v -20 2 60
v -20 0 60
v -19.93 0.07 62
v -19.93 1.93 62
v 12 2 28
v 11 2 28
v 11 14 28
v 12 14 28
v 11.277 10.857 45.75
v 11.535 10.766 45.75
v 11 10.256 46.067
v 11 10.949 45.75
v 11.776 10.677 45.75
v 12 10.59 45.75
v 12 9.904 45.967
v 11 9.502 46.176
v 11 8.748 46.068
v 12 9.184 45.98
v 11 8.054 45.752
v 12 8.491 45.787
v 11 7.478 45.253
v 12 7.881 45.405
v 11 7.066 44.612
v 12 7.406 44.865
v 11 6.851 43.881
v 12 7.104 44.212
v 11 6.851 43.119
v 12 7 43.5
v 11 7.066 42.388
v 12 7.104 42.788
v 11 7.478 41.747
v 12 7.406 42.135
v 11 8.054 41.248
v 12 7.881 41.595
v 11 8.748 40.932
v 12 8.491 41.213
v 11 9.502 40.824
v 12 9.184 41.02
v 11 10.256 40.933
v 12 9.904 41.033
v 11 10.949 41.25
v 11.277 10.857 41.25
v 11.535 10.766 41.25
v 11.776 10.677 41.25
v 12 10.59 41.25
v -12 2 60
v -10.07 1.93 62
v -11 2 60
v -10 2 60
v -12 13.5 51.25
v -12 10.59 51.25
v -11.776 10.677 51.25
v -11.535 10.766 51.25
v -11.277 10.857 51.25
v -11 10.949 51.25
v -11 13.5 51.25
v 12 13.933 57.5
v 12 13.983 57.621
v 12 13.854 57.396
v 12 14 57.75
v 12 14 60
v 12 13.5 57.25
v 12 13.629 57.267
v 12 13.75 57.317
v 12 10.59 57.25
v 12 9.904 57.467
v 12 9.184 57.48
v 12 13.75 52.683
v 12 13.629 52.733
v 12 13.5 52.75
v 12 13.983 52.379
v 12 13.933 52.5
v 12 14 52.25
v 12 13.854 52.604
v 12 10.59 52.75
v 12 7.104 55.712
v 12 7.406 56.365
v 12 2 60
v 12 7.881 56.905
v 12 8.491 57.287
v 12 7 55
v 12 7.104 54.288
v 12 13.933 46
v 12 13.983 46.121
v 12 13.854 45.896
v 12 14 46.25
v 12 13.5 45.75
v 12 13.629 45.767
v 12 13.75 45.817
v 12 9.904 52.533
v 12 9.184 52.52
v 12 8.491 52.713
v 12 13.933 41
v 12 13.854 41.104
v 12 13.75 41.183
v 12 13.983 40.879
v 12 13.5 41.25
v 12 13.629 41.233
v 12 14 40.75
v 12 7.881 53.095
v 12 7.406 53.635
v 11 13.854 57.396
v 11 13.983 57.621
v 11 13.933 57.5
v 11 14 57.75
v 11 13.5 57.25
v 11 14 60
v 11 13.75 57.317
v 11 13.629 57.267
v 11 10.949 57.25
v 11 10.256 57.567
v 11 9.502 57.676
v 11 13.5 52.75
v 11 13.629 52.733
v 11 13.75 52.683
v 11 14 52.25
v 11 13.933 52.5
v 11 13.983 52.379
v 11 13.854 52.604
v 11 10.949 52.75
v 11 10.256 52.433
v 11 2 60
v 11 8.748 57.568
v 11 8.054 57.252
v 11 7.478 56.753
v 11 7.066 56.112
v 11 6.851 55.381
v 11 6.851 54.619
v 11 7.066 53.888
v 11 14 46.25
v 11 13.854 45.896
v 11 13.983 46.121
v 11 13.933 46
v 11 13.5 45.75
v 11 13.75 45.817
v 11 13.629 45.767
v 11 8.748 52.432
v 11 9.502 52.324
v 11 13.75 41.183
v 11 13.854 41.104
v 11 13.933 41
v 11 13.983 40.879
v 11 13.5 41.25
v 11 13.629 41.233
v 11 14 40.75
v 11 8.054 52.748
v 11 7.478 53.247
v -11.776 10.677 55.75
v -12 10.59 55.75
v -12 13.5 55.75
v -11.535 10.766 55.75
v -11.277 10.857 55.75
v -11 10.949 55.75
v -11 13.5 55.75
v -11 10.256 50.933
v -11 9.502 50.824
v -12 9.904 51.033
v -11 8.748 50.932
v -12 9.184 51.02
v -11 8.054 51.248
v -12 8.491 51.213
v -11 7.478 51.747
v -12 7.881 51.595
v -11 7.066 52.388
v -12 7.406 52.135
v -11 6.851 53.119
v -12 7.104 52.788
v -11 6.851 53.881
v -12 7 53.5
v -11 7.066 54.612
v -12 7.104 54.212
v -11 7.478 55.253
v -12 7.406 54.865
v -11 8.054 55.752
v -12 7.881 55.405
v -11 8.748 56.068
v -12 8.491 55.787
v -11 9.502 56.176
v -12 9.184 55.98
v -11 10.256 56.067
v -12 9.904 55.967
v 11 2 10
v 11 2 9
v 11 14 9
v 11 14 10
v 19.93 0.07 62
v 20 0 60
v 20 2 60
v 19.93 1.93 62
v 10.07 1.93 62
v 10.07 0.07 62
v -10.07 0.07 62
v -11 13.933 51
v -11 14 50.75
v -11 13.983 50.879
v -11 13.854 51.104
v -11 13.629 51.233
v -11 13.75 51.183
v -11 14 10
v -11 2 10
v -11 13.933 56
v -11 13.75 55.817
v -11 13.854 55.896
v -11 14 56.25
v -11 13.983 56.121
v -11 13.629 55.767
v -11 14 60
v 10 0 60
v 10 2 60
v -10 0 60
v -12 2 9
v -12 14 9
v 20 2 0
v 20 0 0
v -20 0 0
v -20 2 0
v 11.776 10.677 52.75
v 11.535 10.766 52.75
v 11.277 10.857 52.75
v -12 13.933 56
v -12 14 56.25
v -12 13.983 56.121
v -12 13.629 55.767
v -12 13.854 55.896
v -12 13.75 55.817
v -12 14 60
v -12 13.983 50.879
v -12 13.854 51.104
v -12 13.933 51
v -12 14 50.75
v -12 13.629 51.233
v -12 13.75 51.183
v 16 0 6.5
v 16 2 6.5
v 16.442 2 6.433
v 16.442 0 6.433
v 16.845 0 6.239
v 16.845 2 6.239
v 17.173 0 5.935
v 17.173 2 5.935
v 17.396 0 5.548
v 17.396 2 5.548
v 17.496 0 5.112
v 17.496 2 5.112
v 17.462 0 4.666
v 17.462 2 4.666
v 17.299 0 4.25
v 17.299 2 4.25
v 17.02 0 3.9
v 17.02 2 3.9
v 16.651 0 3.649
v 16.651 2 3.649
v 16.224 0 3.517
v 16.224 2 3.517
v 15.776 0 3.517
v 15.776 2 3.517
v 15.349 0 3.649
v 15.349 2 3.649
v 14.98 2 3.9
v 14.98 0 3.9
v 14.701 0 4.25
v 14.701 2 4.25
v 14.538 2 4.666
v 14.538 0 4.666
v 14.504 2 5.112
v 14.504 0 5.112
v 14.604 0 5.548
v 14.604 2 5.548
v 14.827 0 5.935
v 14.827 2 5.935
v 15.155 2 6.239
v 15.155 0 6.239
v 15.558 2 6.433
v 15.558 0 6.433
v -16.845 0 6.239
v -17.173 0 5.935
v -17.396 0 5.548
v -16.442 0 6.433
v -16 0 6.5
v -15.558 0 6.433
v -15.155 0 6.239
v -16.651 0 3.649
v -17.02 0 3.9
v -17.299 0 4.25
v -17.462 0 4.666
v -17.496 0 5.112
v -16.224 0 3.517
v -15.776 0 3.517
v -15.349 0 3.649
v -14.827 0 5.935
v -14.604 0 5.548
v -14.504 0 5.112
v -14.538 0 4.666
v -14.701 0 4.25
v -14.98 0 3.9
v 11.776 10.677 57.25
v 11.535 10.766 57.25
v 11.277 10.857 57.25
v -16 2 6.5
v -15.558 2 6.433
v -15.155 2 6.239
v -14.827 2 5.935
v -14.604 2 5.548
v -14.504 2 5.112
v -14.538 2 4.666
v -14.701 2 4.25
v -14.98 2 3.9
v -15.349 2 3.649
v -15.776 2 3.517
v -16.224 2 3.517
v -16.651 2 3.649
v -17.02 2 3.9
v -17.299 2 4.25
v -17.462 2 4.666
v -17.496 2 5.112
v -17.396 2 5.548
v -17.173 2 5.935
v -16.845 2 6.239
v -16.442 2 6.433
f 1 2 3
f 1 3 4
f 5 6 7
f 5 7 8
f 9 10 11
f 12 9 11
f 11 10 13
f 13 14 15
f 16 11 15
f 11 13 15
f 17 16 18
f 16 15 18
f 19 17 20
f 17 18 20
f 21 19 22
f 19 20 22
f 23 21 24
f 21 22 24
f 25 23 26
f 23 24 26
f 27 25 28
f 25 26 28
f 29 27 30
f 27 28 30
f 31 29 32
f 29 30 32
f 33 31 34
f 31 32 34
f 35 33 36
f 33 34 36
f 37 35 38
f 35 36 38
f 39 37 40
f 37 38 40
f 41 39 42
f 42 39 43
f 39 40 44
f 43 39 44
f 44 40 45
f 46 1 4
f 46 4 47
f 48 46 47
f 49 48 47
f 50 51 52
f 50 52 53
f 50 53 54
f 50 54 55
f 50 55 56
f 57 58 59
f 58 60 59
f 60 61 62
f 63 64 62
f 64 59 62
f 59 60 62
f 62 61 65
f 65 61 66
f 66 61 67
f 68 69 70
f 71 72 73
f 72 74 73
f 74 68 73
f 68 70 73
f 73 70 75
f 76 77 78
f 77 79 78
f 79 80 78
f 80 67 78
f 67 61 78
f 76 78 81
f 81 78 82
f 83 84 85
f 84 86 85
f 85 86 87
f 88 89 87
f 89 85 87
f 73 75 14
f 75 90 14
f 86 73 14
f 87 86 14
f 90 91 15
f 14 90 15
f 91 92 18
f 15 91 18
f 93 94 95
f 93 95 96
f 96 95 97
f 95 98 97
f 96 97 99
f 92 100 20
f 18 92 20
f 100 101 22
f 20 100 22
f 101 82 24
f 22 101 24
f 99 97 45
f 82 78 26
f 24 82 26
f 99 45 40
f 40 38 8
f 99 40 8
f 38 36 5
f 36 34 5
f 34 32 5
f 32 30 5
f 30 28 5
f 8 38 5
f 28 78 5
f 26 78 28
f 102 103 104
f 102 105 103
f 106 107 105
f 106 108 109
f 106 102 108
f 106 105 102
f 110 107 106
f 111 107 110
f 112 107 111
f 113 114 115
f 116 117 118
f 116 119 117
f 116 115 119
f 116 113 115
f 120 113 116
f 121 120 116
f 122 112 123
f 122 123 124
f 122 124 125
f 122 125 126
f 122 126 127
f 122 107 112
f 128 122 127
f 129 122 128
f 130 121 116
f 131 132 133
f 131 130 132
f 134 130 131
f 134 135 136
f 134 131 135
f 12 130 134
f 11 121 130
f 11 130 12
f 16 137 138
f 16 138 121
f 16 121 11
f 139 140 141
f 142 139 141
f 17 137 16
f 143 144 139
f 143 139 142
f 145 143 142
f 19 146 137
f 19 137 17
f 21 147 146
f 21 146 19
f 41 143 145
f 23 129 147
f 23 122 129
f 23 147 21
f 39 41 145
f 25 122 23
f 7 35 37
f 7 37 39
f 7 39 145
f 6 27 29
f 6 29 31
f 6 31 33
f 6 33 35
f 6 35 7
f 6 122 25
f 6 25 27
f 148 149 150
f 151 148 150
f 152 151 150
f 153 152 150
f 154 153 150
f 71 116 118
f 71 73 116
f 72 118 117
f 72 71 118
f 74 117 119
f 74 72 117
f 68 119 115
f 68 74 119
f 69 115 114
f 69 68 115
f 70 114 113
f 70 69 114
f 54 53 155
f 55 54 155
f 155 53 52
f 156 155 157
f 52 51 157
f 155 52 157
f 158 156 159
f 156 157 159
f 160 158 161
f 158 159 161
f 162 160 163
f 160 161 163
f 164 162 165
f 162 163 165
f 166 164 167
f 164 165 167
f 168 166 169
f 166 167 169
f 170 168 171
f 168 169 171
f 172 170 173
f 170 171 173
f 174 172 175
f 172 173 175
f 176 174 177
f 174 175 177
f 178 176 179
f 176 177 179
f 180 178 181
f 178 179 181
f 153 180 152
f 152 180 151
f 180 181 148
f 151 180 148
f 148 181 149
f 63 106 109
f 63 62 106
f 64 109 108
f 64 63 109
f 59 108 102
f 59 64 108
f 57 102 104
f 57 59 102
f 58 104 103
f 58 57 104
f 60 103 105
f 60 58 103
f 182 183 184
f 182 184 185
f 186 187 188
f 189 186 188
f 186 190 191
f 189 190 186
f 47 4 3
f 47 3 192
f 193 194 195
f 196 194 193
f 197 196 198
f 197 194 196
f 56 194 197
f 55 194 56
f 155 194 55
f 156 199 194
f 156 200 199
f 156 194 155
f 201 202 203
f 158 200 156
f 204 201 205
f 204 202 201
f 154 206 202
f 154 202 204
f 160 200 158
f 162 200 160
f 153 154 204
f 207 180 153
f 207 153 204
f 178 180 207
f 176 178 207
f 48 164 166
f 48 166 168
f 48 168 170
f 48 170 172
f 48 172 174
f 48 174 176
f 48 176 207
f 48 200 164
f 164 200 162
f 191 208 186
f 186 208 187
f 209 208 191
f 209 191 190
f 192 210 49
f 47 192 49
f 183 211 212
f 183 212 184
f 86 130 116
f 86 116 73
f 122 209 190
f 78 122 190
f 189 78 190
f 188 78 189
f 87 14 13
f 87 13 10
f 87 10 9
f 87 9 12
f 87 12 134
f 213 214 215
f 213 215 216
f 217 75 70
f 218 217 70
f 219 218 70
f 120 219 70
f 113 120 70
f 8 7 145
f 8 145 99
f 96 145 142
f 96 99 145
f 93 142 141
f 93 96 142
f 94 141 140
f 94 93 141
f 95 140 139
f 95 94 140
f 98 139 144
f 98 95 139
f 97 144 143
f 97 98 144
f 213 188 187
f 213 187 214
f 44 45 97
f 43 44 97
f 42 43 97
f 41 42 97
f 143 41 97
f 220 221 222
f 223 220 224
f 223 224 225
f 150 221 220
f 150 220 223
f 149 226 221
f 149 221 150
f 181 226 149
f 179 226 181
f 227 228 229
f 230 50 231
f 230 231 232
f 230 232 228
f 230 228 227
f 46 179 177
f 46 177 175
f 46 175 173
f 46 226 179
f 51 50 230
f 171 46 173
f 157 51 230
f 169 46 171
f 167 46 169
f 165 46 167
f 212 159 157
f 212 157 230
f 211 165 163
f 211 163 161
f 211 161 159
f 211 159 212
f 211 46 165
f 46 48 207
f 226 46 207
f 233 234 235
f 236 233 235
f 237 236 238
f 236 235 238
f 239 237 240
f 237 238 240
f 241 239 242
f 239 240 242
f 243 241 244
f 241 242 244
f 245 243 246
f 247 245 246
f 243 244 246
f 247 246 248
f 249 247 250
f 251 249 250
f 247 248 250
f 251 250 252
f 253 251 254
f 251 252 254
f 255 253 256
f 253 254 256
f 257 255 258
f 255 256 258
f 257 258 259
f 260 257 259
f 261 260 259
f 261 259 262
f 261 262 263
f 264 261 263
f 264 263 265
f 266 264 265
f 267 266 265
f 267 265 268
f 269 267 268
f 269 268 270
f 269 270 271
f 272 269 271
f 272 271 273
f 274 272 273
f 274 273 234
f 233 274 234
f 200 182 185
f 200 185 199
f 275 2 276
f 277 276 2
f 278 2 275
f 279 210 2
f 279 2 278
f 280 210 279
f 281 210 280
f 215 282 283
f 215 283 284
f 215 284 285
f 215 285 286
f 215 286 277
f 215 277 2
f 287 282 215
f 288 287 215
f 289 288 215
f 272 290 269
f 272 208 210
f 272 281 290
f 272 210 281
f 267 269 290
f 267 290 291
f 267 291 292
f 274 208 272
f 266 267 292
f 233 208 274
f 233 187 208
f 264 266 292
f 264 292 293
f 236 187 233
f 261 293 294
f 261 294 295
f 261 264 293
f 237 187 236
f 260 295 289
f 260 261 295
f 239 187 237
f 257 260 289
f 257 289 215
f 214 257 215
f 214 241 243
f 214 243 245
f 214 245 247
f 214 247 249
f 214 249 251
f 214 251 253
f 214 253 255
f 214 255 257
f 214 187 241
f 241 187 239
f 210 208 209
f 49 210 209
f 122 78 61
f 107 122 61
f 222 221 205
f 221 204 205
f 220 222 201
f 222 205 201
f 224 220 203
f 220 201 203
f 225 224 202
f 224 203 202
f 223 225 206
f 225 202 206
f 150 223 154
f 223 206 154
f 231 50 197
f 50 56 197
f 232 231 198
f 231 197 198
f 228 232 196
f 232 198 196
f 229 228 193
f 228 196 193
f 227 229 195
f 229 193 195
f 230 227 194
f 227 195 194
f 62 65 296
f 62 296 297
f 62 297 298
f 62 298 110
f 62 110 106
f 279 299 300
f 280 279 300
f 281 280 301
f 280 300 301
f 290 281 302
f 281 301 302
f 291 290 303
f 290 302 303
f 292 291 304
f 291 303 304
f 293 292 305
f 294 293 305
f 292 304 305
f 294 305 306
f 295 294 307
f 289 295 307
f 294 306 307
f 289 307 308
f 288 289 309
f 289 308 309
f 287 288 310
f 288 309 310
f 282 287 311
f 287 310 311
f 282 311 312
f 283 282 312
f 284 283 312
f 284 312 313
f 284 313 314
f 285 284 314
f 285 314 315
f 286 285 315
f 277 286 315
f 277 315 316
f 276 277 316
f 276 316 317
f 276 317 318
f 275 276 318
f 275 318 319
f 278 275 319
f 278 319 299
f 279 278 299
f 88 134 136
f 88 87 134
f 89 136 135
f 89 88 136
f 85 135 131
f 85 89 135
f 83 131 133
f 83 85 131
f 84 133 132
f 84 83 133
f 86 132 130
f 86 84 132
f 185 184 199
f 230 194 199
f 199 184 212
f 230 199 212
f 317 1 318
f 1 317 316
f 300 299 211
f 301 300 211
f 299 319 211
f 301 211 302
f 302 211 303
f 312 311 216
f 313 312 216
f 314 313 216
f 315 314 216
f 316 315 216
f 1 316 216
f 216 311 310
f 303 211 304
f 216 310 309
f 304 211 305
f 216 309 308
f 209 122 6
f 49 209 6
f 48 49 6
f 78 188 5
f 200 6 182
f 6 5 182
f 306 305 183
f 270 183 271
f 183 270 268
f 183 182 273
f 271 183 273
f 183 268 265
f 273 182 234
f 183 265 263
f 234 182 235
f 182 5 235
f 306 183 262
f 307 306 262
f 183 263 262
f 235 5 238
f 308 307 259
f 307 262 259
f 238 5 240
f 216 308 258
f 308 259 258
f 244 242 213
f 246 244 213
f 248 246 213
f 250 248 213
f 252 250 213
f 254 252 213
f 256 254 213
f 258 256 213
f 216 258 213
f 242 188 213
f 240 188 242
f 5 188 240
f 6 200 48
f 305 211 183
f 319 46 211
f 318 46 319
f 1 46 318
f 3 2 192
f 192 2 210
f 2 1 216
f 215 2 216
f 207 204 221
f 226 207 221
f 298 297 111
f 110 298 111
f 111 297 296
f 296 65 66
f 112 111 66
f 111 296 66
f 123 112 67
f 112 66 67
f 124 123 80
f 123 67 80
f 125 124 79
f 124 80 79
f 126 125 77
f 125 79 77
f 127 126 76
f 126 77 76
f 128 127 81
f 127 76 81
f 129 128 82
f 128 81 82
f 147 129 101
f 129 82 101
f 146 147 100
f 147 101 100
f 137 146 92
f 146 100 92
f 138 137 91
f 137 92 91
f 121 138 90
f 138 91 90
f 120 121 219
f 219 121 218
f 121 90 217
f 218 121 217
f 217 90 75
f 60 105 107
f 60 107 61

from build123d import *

# Parameters (mm, degrees)
SKETCH1_W                     = 60
SKETCH1_H                     = 2
EXTRUDE_THIN1_DEPTH           = 20
SKETCH2_W                     = 1
SKETCH2_H                     = 32
EXTRUDE_THIN2_DEPTH           = 12
SKETCH3_R                     = 1.5
CUT_EXTRUDE1_DEPTH            = 65.373907758
SKETCH4_W                     = 10
SKETCH4_H                     = 2
BOSS_EXTRUDE1_DEPTH           = 2
BOSS_EXTRUDE1_DRAFT           = 2
BOSS_EXTRUDE1_PROFILE_2_DEPTH = 2
BOSS_EXTRUDE1_PROFILE_2_DRAFT = 2
SKETCH6_R                     = 2.5
CUT_EXTRUDE4_DEPTH            = 1
CUT_EXTRUDE4_DRAFT            = 10
CUT_EXTRUDE4_PROFILE_2_DEPTH  = 1
CUT_EXTRUDE4_PROFILE_2_DRAFT  = 10
SKETCH7_R                     = 2.5
CUT_EXTRUDE6_DEPTH            = 1
CUT_EXTRUDE6_DRAFT            = 10
CUT_EXTRUDE7_REACH            = 73.162
SKETCH8_W                     = 4.5
SKETCH8_H                     = 6.050990024
CUT_EXTRUDE8_REACH            = 73.162
SKETCH9_W                     = 4.5
SKETCH9_H                     = 5.78600983
FILLET1_R                     = 0.5


with BuildPart() as part:
    # Sketch1 → Extrude-Thin1 (new, symmetric)
    with BuildSketch(Plane(origin=(0, 0, 0), x_dir=(0, 0, -1), z_dir=(1, 0, 0))):
        with Locations((-30, 1)):
            Rectangle(SKETCH1_W, SKETCH1_H)
    extrude(amount=EXTRUDE_THIN1_DEPTH, both=True)

    # Sketch2 → Extrude-Thin2 (add)
    with BuildSketch(Plane(origin=(0, 2, 0), x_dir=(1, 0, 0), z_dir=(0, 1, 0))):
        with Locations((11.5, -44)):
            Rectangle(SKETCH2_W, SKETCH2_H)
        Polygon((11, -10), (-11, -10), (-11, -60), (-12, -60), (-12, -9), (11, -9), align=None)
    extrude(amount=EXTRUDE_THIN2_DEPTH)

    # Sketch3 → Cut-Extrude1 (cut, through all)
    with BuildSketch(Plane(origin=(0, 2, 0), x_dir=(1, 0, 0), z_dir=(0, 1, 0))):
        with Locations(Location((-16, -5, 0), (0, 0, 270))):
            Circle(SKETCH3_R)
        with Locations(Location((16, -5, 0), (0, 0, 270))):
            Circle(SKETCH3_R)
    extrude(amount=-CUT_EXTRUDE1_DEPTH, mode=Mode.SUBTRACT)


with BuildPart() as boss_extrude1_tool:
    # Sketch4 → Boss-Extrude1 (with draft: the straight prism first)
    with BuildSketch(Plane.XY.offset(60)):
        with Locations((-15, 1)):
            Rectangle(SKETCH4_W, SKETCH4_H)
    extrude(amount=BOSS_EXTRUDE1_DEPTH)
    # Boss-Extrude1: the draft: its side faces are tilted about the plane it starts from
    boss_extrude1_sides = [boss_extrude1_tool.faces().sort_by_distance(p)[0] for p in [
        (-20, 1, 61),
        (-15, 0, 61),
        (-10, 1, 61),
        (-15, 2, 61),
    ]]
    draft(boss_extrude1_sides, Plane.XY.offset(60), BOSS_EXTRUDE1_DRAFT)


with BuildPart() as part_1:
    add(part.part)

    # Boss-Extrude1: add boss_extrude1_tool
    add(boss_extrude1_tool.part)


with BuildPart() as boss_extrude1_profile_2_tool:
    # Sketch4 → Boss-Extrude1 profile 2 (with draft: the straight prism first)
    with BuildSketch(Plane.XY.offset(60)):
        with Locations((15, 1)):
            Rectangle(SKETCH4_W, SKETCH4_H)
    extrude(amount=BOSS_EXTRUDE1_PROFILE_2_DEPTH)
    # Boss-Extrude1 profile 2: the draft: its side faces are tilted about the plane it starts from
    boss_extrude1_profile_2_sides = [boss_extrude1_profile_2_tool.faces().sort_by_distance(p)[0] for p in [
        (10, 1, 61),
        (15, 0, 61),
        (20, 1, 61),
        (15, 2, 61),
    ]]
    draft(boss_extrude1_profile_2_sides, Plane.XY.offset(60), BOSS_EXTRUDE1_PROFILE_2_DRAFT)


with BuildPart() as part_2:
    add(part_1.part)

    # Boss-Extrude1 profile 2: add boss_extrude1_profile_2_tool
    add(boss_extrude1_profile_2_tool.part)


with BuildPart() as cut_extrude4_tool:
    # Sketch6 → Cut-Extrude4 (with draft: the straight prism first)
    with BuildSketch(Plane(origin=(12, 0, 0), x_dir=(0, 0, -1), z_dir=(1, 0, 0))):
        with Locations((-55, 9.5)):
            Circle(SKETCH6_R)
    extrude(amount=-CUT_EXTRUDE4_DEPTH)
    # Cut-Extrude4: the draft: its side faces are tilted about the plane it starts from
    cut_extrude4_sides = [cut_extrude4_tool.faces().sort_by_distance(p)[0] for p in [
        (11.5, 9.5, 57.5),
    ]]
    draft(cut_extrude4_sides, Plane(origin=(12, 0, 0), x_dir=(0, 0, -1), z_dir=(1, 0, 0)), CUT_EXTRUDE4_DRAFT)


with BuildPart() as part_3:
    add(part_2.part)

    # Cut-Extrude4: cut by cut_extrude4_tool
    add(cut_extrude4_tool.part, mode=Mode.SUBTRACT)


with BuildPart() as cut_extrude4_profile_2_tool:
    # Sketch6 → Cut-Extrude4 profile 2 (with draft: the straight prism first)
    with BuildSketch(Plane(origin=(12, 0, 0), x_dir=(0, 0, -1), z_dir=(1, 0, 0))):
        with Locations((-43.5, 9.5)):
            Circle(SKETCH6_R)
    extrude(amount=-CUT_EXTRUDE4_PROFILE_2_DEPTH)
    # Cut-Extrude4 profile 2: the draft: its side faces are tilted about the plane it starts from
    cut_extrude4_profile_2_sides = [cut_extrude4_profile_2_tool.faces().sort_by_distance(p)[0] for p in [
        (11.5, 9.5, 46),
    ]]
    draft(cut_extrude4_profile_2_sides, Plane(origin=(12, 0, 0), x_dir=(0, 0, -1), z_dir=(1, 0, 0)), CUT_EXTRUDE4_PROFILE_2_DRAFT)


with BuildPart() as part_4:
    add(part_3.part)

    # Cut-Extrude4 profile 2: cut by cut_extrude4_profile_2_tool
    add(cut_extrude4_profile_2_tool.part, mode=Mode.SUBTRACT)


with BuildPart() as cut_extrude6_tool:
    # Sketch7 → Cut-Extrude6 (with draft: the straight prism first)
    with BuildSketch(Plane.ZY.offset(12)):
        with Locations((53.5, 9.5)):
            Circle(SKETCH7_R)
    extrude(amount=-CUT_EXTRUDE6_DEPTH)
    # Cut-Extrude6: the draft: its side faces are tilted about the plane it starts from
    cut_extrude6_sides = [cut_extrude6_tool.faces().sort_by_distance(p)[0] for p in [
        (-11.5, 9.5, 51),
    ]]
    draft(cut_extrude6_sides, Plane.ZY.offset(12), CUT_EXTRUDE6_DRAFT)


with BuildPart() as part_5:
    add(part_4.part)

    # Cut-Extrude6: cut by cut_extrude6_tool
    add(cut_extrude6_tool.part, mode=Mode.SUBTRACT)

    # Sketch8 → Cut-Extrude7 (cut, up to next)
    with BuildSketch(Plane(origin=(12, 0, 0), x_dir=(0, 0, -1), z_dir=(1, 0, 0)), mode=Mode.PRIVATE) as cut_extrude7_sk1:
        with Locations((-55, 12.491774439)):
            Rectangle(SKETCH8_W, SKETCH8_H)
    cut_extrude7_tool1 = extrude(cut_extrude7_sk1.sketch, amount=-CUT_EXTRUDE7_REACH, mode=Mode.PRIVATE) & part_5.part
    # Sketch8 → Cut-Extrude7 (cut, up to next)
    with BuildSketch(Plane(origin=(12, 0, 0), x_dir=(0, 0, -1), z_dir=(1, 0, 0)), mode=Mode.PRIVATE) as cut_extrude7_sk2:
        with Locations((-43.5, 12.460513527)):
            Rectangle(SKETCH8_W, SKETCH8_H)
    cut_extrude7_tool2 = extrude(cut_extrude7_sk2.sketch, amount=-CUT_EXTRUDE7_REACH, mode=Mode.PRIVATE) & part_5.part
    add(cut_extrude7_tool1.solids().sort_by_distance((12, 12.491774, 55))[0], mode=Mode.SUBTRACT)
    add(cut_extrude7_tool2.solids().sort_by_distance((12, 12.460514, 43.5))[0], mode=Mode.SUBTRACT)

    # Sketch9 → Cut-Extrude8 (cut, up to next)
    with BuildSketch(Plane.ZY.offset(12), mode=Mode.PRIVATE) as cut_extrude8_sk1:
        with Locations((53.5, 13.082945191)):
            Rectangle(SKETCH9_W, SKETCH9_H)
    cut_extrude8_tool1 = extrude(cut_extrude8_sk1.sketch, amount=-CUT_EXTRUDE8_REACH, mode=Mode.PRIVATE) & part_5.part
    add(cut_extrude8_tool1.solids().sort_by_distance((-12, 13.082945, 53.5))[0], mode=Mode.SUBTRACT)

    # Fillet1
    fillet1_edges = [part_5.edges().sort_by_distance(p)[0] for p in [
        (11.5, 14, 52.75),
        (11.5, 14, 57.25),
        (11.5, 14, 41.25),
        (11.5, 14, 45.75),
        (-11.5, 14, 55.75),
        (-11.5, 14, 51.25),
    ]]
    fillet(fillet1_edges, radius=FILLET1_R)


solid = part_5.part
